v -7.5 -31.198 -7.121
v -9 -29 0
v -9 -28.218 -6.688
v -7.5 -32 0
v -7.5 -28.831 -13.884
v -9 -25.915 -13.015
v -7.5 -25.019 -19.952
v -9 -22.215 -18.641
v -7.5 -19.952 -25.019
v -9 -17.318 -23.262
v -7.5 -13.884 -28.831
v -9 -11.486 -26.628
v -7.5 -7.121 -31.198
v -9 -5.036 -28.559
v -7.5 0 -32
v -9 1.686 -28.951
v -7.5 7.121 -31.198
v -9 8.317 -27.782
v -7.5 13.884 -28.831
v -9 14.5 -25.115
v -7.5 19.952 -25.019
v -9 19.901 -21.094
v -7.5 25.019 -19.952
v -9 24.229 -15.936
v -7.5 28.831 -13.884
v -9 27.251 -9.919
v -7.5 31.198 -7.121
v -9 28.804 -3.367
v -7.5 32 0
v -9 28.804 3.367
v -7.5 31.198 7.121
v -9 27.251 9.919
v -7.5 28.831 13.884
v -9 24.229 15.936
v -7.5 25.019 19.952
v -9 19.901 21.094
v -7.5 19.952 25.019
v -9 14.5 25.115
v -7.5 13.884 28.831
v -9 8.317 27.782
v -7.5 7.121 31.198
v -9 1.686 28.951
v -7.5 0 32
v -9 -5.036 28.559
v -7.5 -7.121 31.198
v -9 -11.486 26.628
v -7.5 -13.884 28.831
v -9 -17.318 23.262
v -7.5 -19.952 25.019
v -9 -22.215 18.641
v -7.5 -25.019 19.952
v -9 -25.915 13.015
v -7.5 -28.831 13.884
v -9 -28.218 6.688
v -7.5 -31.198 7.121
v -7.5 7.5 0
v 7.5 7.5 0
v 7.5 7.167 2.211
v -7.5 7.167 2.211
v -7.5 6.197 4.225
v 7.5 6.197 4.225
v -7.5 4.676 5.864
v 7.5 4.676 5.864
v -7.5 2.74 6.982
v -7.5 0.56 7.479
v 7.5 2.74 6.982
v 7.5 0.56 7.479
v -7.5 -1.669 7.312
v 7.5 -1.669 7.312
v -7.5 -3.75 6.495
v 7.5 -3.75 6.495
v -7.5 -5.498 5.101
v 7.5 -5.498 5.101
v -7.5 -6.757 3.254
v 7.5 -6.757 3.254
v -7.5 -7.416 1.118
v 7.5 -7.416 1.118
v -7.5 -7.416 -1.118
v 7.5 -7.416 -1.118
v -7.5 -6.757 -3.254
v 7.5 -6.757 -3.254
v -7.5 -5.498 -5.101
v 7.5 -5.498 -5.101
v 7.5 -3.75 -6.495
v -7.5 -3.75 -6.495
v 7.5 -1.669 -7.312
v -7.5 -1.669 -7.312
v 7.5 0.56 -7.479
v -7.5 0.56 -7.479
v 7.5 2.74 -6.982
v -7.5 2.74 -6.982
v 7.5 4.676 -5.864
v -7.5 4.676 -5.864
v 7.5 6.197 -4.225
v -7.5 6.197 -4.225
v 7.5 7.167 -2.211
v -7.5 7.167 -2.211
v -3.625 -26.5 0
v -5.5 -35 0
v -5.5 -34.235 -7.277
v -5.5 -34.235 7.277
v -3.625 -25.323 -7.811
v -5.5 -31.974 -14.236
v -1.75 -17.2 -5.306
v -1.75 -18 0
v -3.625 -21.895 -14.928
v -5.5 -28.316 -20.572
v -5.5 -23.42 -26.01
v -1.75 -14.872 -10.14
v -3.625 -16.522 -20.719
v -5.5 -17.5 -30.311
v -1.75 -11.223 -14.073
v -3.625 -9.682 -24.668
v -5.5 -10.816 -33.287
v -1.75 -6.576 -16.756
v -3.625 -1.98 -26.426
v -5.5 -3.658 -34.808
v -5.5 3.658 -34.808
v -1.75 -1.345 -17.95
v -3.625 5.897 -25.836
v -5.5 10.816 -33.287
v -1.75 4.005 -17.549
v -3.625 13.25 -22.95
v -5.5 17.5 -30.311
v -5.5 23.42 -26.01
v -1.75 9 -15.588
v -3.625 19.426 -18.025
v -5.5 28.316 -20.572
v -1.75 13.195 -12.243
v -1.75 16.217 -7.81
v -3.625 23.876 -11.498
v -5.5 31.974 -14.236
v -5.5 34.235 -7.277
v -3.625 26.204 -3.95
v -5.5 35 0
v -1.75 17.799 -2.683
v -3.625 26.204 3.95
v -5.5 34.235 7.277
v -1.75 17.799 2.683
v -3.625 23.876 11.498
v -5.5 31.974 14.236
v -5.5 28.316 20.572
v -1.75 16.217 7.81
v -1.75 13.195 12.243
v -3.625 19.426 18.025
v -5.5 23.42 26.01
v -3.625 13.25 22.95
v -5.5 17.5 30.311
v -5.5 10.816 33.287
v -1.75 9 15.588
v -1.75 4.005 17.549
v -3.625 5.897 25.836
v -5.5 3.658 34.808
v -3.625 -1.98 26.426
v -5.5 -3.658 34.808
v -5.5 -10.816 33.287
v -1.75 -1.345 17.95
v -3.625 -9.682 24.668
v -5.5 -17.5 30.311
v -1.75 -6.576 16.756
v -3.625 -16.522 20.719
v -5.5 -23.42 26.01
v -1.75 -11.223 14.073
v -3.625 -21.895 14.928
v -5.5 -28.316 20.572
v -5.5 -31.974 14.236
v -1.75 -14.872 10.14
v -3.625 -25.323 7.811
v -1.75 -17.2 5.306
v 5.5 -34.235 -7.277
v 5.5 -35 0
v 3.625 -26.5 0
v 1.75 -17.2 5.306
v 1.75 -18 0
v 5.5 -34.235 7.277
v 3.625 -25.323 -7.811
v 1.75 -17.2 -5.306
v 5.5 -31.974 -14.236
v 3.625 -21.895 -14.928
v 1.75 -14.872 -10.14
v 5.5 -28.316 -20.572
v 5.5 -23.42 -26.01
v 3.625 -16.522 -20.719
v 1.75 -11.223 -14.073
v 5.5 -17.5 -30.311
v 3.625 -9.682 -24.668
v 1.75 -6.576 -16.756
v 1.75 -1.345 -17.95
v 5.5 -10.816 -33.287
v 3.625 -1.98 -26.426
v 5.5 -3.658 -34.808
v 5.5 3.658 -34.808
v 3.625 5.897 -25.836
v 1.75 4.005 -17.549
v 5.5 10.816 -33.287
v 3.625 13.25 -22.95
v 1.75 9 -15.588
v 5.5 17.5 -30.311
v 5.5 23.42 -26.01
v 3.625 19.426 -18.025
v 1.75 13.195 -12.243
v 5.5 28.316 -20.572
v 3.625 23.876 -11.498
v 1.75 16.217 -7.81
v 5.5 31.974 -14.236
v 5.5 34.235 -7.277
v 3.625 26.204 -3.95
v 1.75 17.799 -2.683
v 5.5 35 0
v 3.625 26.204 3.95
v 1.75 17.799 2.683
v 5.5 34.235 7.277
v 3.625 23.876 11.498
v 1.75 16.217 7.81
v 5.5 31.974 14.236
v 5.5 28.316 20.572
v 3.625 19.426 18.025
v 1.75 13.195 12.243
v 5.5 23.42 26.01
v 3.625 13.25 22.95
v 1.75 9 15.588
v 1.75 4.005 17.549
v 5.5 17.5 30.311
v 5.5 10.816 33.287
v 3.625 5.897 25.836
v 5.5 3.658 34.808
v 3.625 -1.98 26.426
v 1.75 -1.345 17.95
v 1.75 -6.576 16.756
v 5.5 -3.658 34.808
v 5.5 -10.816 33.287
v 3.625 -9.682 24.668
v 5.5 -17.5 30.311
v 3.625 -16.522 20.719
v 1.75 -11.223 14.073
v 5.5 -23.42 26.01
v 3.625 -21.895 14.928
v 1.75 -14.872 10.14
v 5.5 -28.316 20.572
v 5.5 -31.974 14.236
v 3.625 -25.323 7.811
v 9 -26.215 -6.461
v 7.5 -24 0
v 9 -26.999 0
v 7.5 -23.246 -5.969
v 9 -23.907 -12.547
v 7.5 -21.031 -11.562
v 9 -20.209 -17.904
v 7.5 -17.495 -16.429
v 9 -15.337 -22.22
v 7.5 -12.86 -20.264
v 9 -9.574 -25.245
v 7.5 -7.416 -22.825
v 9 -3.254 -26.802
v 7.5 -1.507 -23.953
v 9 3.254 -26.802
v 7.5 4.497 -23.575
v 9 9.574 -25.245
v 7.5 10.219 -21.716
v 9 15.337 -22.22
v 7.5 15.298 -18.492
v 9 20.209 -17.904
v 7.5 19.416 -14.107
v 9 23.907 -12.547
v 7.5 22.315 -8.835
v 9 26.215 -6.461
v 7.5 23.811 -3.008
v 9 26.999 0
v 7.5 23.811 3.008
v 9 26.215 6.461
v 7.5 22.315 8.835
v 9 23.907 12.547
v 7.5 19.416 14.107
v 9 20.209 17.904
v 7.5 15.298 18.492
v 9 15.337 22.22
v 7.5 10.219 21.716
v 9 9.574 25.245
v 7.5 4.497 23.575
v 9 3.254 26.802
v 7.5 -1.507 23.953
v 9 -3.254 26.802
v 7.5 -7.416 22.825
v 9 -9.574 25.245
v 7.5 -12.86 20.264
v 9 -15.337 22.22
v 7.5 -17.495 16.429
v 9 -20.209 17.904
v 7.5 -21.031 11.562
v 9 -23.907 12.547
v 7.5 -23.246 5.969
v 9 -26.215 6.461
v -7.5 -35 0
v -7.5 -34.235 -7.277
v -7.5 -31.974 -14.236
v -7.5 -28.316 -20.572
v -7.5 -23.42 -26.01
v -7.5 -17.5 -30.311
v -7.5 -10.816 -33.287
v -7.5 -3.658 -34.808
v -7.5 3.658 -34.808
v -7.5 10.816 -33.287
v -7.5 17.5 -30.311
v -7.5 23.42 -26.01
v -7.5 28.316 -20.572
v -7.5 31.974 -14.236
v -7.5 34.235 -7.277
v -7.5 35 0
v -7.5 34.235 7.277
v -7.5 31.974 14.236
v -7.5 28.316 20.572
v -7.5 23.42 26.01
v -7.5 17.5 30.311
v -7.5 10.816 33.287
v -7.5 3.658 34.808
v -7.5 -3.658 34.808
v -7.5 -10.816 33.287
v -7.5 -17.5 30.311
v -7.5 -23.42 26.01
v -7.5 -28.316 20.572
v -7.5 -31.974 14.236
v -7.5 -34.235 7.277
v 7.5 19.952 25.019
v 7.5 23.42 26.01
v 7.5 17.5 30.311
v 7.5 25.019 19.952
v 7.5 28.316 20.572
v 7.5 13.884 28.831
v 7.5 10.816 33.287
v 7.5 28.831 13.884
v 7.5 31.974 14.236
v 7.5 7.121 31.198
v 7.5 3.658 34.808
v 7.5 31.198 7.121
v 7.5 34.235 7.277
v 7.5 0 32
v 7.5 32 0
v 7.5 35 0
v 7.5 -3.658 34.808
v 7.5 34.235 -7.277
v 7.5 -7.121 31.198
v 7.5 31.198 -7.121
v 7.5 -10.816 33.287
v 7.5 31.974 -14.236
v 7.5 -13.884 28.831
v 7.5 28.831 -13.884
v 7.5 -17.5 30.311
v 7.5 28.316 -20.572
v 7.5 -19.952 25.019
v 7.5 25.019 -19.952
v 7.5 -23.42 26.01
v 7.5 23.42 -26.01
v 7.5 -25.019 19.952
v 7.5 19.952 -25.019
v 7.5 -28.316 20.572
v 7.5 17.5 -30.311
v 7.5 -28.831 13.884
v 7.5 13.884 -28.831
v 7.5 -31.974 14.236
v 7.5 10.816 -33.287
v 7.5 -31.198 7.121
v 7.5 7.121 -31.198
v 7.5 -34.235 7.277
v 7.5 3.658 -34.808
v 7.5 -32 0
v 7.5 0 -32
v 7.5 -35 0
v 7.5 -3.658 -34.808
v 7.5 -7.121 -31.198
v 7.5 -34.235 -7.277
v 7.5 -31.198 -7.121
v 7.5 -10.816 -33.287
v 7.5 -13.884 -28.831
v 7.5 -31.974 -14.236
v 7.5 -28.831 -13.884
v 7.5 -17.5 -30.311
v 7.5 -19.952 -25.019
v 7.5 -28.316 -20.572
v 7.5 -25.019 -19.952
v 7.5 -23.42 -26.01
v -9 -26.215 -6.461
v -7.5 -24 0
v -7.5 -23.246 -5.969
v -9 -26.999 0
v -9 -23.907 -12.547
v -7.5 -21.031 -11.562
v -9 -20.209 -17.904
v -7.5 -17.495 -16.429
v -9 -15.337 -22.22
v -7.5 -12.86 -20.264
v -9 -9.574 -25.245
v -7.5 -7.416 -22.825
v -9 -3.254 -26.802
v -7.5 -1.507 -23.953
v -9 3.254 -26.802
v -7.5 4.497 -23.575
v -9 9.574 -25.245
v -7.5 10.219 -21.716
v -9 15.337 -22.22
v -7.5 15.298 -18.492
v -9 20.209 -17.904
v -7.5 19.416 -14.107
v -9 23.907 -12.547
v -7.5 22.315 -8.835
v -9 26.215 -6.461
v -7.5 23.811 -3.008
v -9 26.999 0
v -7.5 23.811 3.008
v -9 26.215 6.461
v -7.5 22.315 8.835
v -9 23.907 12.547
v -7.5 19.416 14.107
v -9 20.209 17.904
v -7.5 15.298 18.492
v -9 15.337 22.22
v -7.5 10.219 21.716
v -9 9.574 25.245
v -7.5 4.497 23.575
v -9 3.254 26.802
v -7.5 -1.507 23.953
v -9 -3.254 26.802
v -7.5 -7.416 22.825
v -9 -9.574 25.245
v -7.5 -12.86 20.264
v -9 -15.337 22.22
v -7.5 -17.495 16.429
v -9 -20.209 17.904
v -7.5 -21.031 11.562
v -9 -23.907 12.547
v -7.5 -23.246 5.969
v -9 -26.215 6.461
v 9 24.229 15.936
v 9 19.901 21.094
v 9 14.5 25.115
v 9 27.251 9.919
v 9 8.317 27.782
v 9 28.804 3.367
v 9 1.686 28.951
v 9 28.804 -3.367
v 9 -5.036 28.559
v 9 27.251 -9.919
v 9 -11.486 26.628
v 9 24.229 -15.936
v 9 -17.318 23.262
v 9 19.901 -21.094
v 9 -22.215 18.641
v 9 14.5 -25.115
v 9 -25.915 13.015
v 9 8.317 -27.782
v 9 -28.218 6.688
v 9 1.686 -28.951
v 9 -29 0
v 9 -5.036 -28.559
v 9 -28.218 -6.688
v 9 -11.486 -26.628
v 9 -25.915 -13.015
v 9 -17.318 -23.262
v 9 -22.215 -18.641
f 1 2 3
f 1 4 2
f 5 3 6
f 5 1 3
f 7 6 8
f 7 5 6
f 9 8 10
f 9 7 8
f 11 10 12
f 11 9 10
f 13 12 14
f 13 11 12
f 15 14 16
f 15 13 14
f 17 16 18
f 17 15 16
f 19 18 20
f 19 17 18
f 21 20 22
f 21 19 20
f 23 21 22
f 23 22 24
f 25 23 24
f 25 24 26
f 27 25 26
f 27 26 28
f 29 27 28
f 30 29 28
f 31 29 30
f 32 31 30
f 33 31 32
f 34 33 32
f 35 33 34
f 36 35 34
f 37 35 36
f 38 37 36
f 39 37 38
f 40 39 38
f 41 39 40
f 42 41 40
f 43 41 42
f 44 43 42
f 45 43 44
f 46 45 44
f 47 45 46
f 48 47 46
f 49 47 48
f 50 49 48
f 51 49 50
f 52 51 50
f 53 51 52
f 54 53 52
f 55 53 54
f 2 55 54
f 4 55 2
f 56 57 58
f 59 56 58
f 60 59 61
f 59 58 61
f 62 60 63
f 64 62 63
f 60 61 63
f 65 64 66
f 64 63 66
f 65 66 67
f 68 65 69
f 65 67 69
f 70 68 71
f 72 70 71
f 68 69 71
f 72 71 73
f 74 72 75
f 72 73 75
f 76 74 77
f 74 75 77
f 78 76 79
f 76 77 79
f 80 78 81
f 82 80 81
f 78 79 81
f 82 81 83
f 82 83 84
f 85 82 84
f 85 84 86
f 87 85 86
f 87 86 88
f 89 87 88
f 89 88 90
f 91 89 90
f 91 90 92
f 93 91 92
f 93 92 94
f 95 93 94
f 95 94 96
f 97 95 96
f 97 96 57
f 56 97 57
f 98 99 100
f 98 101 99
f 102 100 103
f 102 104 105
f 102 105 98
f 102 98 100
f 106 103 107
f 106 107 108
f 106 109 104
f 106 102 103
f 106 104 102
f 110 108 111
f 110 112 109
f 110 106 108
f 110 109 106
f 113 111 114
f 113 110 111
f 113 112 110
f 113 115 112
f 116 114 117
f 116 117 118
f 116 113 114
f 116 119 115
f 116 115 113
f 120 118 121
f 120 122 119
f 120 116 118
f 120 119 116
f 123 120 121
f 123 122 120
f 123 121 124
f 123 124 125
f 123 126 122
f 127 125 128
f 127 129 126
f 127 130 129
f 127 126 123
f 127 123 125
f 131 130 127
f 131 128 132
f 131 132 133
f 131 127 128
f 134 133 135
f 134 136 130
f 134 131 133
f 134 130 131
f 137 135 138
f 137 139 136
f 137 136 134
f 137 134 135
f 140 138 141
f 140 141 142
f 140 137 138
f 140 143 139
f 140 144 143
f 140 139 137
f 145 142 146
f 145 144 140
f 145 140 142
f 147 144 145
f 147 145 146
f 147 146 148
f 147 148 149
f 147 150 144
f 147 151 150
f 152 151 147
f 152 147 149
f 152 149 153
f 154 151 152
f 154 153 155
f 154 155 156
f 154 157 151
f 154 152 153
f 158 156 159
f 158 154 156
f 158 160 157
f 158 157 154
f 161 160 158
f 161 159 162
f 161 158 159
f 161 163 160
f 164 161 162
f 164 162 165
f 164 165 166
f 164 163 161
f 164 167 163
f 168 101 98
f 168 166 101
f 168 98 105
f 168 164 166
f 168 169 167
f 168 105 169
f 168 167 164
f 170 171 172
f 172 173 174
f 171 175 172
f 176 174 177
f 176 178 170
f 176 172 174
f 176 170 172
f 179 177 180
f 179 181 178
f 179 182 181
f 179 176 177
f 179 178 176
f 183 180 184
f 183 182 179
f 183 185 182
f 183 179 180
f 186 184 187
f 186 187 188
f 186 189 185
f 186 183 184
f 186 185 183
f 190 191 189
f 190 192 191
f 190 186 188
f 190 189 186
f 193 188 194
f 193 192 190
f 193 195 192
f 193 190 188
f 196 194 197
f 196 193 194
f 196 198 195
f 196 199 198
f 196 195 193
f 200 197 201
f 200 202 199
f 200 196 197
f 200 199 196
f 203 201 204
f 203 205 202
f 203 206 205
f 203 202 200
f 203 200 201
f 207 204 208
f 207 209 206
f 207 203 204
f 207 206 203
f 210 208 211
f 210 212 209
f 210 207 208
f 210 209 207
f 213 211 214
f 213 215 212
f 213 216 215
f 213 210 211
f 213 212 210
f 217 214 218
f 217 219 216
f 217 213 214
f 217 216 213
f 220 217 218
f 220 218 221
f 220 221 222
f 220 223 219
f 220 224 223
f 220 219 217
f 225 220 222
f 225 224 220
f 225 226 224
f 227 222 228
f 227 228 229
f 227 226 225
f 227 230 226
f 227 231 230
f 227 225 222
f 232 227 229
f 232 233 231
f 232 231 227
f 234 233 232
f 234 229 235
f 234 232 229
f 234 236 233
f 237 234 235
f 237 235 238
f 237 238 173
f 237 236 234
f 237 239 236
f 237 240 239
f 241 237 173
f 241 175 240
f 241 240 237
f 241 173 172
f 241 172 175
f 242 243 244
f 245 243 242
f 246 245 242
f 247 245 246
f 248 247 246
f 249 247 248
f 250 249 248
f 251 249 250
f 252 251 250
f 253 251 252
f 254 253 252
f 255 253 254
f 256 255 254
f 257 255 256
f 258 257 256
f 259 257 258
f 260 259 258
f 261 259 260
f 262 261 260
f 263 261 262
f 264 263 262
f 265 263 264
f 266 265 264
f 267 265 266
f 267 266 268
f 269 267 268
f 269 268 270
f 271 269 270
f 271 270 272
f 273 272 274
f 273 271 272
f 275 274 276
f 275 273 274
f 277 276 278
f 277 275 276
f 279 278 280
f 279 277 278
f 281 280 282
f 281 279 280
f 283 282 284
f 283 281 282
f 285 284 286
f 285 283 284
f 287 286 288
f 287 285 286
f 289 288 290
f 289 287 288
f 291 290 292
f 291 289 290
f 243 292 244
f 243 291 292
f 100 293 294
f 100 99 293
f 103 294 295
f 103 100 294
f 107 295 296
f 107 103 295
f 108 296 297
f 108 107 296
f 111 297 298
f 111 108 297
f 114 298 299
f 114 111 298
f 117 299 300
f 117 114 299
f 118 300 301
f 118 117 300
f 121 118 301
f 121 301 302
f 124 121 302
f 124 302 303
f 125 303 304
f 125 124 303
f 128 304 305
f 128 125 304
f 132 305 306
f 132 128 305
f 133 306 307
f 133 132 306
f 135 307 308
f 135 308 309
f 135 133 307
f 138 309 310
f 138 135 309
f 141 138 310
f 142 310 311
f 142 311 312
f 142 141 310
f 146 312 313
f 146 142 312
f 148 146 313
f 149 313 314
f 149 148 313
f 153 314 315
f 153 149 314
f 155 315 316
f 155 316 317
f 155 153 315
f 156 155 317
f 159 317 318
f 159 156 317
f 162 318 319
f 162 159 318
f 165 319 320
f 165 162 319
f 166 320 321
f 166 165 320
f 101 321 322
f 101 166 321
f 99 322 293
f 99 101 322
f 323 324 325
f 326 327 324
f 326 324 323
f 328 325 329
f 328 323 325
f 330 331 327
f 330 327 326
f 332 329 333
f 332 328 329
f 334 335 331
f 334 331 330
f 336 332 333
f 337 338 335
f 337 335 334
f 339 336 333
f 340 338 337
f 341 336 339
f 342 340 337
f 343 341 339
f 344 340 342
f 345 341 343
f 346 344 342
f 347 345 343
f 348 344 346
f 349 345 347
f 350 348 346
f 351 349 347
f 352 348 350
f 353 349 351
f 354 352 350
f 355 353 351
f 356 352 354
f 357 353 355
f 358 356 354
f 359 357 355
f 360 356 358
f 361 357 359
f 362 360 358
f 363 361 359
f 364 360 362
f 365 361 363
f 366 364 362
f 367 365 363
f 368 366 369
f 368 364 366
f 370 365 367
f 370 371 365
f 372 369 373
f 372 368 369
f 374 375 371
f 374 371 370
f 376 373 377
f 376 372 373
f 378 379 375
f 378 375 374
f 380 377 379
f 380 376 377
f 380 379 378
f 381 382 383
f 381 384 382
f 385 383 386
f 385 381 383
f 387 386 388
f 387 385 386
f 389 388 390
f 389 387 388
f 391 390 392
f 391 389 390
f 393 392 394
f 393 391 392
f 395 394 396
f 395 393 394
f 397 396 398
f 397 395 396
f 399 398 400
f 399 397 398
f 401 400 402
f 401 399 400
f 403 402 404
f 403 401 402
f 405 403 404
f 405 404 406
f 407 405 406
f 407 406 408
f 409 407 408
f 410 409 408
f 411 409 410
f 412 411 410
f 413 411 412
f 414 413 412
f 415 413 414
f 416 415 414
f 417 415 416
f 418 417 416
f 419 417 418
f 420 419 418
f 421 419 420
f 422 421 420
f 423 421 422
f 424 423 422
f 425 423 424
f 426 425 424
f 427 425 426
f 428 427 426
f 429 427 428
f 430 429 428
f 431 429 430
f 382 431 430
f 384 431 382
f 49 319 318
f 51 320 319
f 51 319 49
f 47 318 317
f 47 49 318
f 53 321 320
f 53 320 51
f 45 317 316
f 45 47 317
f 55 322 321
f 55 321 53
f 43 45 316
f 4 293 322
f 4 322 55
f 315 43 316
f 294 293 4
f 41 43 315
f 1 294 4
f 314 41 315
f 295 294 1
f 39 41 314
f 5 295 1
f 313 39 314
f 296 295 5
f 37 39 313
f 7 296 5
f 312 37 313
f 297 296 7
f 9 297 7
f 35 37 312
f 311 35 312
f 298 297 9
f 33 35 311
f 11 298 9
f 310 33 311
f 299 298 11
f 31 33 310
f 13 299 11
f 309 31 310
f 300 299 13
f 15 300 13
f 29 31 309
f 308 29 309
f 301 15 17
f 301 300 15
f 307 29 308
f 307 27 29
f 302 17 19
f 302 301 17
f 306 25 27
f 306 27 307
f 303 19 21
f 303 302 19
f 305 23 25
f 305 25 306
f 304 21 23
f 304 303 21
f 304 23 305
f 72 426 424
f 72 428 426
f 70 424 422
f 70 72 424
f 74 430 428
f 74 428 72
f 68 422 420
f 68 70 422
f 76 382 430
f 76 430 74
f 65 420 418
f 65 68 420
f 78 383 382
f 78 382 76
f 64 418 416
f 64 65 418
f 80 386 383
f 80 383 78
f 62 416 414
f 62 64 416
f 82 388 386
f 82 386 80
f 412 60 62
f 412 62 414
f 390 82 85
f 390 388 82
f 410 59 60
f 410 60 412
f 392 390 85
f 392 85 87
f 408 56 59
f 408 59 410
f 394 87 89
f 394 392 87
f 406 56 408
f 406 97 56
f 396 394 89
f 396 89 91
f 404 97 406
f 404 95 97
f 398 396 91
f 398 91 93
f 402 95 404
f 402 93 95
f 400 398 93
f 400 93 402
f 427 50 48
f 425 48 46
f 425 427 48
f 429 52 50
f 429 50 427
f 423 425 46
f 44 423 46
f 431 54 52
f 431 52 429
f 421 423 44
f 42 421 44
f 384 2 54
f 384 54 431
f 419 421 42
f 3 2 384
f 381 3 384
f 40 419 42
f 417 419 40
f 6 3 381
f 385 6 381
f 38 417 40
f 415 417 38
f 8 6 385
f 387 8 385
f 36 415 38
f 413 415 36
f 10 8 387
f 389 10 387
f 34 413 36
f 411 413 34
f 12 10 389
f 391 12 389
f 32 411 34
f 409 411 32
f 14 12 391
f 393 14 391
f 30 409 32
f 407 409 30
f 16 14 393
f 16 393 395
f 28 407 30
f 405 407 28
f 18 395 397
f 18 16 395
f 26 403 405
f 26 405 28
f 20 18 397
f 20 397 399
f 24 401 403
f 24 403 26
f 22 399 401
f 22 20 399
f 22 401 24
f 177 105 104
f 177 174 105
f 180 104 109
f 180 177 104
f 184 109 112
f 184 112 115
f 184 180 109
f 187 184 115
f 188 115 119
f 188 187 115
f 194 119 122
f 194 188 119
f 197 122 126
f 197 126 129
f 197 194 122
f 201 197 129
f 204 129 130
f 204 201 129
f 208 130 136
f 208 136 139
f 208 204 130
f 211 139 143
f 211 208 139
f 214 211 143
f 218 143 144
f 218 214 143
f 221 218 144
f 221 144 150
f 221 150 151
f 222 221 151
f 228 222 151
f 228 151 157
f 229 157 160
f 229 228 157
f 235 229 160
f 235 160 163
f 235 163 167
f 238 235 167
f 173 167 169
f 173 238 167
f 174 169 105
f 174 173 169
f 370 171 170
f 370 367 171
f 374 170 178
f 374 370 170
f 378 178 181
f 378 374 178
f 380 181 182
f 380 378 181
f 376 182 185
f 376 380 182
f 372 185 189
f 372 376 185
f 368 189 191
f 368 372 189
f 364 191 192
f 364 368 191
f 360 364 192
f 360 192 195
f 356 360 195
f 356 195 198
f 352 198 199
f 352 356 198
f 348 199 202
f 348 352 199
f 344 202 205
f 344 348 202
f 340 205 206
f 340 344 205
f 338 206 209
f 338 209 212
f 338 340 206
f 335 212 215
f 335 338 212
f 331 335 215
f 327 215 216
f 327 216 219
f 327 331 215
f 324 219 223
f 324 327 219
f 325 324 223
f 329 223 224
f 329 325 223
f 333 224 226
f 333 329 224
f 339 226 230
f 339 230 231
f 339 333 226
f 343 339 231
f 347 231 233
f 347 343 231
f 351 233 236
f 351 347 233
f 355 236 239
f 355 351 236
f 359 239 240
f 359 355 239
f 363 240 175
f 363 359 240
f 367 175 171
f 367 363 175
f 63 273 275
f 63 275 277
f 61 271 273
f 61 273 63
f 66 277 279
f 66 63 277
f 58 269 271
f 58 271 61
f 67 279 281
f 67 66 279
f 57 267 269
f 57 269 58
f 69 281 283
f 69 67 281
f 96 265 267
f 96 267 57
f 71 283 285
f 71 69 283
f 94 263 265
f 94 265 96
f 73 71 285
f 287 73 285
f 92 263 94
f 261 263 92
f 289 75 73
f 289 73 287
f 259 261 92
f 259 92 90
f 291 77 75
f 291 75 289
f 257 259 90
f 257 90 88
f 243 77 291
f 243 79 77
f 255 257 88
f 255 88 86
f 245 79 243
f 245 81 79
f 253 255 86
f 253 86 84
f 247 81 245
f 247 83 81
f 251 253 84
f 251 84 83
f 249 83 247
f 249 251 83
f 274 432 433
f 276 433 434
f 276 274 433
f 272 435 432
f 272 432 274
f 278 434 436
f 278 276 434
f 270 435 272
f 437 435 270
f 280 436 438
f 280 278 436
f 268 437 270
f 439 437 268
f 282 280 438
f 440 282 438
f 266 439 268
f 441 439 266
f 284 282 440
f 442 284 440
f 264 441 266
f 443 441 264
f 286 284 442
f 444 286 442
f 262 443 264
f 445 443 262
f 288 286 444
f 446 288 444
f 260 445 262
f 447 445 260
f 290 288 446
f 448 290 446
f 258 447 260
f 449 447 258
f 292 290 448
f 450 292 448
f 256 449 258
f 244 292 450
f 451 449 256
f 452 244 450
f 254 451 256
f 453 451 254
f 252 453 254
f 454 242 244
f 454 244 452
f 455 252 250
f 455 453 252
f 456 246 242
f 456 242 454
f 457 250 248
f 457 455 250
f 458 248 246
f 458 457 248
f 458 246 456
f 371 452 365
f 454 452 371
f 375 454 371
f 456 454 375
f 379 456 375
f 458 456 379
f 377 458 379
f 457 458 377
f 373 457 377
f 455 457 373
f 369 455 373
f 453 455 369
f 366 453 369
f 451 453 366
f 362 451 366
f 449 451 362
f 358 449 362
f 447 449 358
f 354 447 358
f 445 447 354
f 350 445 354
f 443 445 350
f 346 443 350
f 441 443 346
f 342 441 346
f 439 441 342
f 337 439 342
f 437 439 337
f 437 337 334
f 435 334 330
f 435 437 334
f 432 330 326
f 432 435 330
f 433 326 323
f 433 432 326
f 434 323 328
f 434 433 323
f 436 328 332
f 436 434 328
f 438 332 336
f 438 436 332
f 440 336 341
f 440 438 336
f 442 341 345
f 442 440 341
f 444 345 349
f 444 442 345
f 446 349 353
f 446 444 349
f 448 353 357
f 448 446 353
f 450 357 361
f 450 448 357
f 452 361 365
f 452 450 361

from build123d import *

# Parameters (mm, degrees)
SKETCH_2_R          = 7.5
CUT_EXTRUDE_1_DEPTH = 53.668776329


with BuildPart() as part:
    # Эскиз1 → Повернуть4 (revolve)
    with BuildSketch(Plane.XY, mode=Mode.PRIVATE) as revolve_4_sk:
        Polygon((5.5, 35), (7.5, 35), (7.5, 32), (9, 29), (9, 26.999352312), (7.5, 24), (7.5, 0), (-7.5, 0), (-7.5, 24), (-9, 26.999352312), (-9, 29), (-7.5, 32), (-7.5, 35), (-5.5, 35), (-1.75, 18), (1.75, 18), align=None)
    revolve(revolve_4_sk.sketch.rotate(Axis((0, 0, 0), (1, 0, 0)), 180), axis=Axis((0, 0, 0), (1, 0, 0)))

    # Эскиз2 → Вырез-Вытянуть1 (cut, through all)
    with BuildSketch(Plane(origin=(9, 0, 0), x_dir=(0, 0, -1), z_dir=(1, 0, 0))):
        with Locations(Location((0, 0, 0), (0, 0, 90))):
            Circle(SKETCH_2_R)
    extrude(amount=-CUT_EXTRUDE_1_DEPTH, mode=Mode.SUBTRACT)


solid = part.part
